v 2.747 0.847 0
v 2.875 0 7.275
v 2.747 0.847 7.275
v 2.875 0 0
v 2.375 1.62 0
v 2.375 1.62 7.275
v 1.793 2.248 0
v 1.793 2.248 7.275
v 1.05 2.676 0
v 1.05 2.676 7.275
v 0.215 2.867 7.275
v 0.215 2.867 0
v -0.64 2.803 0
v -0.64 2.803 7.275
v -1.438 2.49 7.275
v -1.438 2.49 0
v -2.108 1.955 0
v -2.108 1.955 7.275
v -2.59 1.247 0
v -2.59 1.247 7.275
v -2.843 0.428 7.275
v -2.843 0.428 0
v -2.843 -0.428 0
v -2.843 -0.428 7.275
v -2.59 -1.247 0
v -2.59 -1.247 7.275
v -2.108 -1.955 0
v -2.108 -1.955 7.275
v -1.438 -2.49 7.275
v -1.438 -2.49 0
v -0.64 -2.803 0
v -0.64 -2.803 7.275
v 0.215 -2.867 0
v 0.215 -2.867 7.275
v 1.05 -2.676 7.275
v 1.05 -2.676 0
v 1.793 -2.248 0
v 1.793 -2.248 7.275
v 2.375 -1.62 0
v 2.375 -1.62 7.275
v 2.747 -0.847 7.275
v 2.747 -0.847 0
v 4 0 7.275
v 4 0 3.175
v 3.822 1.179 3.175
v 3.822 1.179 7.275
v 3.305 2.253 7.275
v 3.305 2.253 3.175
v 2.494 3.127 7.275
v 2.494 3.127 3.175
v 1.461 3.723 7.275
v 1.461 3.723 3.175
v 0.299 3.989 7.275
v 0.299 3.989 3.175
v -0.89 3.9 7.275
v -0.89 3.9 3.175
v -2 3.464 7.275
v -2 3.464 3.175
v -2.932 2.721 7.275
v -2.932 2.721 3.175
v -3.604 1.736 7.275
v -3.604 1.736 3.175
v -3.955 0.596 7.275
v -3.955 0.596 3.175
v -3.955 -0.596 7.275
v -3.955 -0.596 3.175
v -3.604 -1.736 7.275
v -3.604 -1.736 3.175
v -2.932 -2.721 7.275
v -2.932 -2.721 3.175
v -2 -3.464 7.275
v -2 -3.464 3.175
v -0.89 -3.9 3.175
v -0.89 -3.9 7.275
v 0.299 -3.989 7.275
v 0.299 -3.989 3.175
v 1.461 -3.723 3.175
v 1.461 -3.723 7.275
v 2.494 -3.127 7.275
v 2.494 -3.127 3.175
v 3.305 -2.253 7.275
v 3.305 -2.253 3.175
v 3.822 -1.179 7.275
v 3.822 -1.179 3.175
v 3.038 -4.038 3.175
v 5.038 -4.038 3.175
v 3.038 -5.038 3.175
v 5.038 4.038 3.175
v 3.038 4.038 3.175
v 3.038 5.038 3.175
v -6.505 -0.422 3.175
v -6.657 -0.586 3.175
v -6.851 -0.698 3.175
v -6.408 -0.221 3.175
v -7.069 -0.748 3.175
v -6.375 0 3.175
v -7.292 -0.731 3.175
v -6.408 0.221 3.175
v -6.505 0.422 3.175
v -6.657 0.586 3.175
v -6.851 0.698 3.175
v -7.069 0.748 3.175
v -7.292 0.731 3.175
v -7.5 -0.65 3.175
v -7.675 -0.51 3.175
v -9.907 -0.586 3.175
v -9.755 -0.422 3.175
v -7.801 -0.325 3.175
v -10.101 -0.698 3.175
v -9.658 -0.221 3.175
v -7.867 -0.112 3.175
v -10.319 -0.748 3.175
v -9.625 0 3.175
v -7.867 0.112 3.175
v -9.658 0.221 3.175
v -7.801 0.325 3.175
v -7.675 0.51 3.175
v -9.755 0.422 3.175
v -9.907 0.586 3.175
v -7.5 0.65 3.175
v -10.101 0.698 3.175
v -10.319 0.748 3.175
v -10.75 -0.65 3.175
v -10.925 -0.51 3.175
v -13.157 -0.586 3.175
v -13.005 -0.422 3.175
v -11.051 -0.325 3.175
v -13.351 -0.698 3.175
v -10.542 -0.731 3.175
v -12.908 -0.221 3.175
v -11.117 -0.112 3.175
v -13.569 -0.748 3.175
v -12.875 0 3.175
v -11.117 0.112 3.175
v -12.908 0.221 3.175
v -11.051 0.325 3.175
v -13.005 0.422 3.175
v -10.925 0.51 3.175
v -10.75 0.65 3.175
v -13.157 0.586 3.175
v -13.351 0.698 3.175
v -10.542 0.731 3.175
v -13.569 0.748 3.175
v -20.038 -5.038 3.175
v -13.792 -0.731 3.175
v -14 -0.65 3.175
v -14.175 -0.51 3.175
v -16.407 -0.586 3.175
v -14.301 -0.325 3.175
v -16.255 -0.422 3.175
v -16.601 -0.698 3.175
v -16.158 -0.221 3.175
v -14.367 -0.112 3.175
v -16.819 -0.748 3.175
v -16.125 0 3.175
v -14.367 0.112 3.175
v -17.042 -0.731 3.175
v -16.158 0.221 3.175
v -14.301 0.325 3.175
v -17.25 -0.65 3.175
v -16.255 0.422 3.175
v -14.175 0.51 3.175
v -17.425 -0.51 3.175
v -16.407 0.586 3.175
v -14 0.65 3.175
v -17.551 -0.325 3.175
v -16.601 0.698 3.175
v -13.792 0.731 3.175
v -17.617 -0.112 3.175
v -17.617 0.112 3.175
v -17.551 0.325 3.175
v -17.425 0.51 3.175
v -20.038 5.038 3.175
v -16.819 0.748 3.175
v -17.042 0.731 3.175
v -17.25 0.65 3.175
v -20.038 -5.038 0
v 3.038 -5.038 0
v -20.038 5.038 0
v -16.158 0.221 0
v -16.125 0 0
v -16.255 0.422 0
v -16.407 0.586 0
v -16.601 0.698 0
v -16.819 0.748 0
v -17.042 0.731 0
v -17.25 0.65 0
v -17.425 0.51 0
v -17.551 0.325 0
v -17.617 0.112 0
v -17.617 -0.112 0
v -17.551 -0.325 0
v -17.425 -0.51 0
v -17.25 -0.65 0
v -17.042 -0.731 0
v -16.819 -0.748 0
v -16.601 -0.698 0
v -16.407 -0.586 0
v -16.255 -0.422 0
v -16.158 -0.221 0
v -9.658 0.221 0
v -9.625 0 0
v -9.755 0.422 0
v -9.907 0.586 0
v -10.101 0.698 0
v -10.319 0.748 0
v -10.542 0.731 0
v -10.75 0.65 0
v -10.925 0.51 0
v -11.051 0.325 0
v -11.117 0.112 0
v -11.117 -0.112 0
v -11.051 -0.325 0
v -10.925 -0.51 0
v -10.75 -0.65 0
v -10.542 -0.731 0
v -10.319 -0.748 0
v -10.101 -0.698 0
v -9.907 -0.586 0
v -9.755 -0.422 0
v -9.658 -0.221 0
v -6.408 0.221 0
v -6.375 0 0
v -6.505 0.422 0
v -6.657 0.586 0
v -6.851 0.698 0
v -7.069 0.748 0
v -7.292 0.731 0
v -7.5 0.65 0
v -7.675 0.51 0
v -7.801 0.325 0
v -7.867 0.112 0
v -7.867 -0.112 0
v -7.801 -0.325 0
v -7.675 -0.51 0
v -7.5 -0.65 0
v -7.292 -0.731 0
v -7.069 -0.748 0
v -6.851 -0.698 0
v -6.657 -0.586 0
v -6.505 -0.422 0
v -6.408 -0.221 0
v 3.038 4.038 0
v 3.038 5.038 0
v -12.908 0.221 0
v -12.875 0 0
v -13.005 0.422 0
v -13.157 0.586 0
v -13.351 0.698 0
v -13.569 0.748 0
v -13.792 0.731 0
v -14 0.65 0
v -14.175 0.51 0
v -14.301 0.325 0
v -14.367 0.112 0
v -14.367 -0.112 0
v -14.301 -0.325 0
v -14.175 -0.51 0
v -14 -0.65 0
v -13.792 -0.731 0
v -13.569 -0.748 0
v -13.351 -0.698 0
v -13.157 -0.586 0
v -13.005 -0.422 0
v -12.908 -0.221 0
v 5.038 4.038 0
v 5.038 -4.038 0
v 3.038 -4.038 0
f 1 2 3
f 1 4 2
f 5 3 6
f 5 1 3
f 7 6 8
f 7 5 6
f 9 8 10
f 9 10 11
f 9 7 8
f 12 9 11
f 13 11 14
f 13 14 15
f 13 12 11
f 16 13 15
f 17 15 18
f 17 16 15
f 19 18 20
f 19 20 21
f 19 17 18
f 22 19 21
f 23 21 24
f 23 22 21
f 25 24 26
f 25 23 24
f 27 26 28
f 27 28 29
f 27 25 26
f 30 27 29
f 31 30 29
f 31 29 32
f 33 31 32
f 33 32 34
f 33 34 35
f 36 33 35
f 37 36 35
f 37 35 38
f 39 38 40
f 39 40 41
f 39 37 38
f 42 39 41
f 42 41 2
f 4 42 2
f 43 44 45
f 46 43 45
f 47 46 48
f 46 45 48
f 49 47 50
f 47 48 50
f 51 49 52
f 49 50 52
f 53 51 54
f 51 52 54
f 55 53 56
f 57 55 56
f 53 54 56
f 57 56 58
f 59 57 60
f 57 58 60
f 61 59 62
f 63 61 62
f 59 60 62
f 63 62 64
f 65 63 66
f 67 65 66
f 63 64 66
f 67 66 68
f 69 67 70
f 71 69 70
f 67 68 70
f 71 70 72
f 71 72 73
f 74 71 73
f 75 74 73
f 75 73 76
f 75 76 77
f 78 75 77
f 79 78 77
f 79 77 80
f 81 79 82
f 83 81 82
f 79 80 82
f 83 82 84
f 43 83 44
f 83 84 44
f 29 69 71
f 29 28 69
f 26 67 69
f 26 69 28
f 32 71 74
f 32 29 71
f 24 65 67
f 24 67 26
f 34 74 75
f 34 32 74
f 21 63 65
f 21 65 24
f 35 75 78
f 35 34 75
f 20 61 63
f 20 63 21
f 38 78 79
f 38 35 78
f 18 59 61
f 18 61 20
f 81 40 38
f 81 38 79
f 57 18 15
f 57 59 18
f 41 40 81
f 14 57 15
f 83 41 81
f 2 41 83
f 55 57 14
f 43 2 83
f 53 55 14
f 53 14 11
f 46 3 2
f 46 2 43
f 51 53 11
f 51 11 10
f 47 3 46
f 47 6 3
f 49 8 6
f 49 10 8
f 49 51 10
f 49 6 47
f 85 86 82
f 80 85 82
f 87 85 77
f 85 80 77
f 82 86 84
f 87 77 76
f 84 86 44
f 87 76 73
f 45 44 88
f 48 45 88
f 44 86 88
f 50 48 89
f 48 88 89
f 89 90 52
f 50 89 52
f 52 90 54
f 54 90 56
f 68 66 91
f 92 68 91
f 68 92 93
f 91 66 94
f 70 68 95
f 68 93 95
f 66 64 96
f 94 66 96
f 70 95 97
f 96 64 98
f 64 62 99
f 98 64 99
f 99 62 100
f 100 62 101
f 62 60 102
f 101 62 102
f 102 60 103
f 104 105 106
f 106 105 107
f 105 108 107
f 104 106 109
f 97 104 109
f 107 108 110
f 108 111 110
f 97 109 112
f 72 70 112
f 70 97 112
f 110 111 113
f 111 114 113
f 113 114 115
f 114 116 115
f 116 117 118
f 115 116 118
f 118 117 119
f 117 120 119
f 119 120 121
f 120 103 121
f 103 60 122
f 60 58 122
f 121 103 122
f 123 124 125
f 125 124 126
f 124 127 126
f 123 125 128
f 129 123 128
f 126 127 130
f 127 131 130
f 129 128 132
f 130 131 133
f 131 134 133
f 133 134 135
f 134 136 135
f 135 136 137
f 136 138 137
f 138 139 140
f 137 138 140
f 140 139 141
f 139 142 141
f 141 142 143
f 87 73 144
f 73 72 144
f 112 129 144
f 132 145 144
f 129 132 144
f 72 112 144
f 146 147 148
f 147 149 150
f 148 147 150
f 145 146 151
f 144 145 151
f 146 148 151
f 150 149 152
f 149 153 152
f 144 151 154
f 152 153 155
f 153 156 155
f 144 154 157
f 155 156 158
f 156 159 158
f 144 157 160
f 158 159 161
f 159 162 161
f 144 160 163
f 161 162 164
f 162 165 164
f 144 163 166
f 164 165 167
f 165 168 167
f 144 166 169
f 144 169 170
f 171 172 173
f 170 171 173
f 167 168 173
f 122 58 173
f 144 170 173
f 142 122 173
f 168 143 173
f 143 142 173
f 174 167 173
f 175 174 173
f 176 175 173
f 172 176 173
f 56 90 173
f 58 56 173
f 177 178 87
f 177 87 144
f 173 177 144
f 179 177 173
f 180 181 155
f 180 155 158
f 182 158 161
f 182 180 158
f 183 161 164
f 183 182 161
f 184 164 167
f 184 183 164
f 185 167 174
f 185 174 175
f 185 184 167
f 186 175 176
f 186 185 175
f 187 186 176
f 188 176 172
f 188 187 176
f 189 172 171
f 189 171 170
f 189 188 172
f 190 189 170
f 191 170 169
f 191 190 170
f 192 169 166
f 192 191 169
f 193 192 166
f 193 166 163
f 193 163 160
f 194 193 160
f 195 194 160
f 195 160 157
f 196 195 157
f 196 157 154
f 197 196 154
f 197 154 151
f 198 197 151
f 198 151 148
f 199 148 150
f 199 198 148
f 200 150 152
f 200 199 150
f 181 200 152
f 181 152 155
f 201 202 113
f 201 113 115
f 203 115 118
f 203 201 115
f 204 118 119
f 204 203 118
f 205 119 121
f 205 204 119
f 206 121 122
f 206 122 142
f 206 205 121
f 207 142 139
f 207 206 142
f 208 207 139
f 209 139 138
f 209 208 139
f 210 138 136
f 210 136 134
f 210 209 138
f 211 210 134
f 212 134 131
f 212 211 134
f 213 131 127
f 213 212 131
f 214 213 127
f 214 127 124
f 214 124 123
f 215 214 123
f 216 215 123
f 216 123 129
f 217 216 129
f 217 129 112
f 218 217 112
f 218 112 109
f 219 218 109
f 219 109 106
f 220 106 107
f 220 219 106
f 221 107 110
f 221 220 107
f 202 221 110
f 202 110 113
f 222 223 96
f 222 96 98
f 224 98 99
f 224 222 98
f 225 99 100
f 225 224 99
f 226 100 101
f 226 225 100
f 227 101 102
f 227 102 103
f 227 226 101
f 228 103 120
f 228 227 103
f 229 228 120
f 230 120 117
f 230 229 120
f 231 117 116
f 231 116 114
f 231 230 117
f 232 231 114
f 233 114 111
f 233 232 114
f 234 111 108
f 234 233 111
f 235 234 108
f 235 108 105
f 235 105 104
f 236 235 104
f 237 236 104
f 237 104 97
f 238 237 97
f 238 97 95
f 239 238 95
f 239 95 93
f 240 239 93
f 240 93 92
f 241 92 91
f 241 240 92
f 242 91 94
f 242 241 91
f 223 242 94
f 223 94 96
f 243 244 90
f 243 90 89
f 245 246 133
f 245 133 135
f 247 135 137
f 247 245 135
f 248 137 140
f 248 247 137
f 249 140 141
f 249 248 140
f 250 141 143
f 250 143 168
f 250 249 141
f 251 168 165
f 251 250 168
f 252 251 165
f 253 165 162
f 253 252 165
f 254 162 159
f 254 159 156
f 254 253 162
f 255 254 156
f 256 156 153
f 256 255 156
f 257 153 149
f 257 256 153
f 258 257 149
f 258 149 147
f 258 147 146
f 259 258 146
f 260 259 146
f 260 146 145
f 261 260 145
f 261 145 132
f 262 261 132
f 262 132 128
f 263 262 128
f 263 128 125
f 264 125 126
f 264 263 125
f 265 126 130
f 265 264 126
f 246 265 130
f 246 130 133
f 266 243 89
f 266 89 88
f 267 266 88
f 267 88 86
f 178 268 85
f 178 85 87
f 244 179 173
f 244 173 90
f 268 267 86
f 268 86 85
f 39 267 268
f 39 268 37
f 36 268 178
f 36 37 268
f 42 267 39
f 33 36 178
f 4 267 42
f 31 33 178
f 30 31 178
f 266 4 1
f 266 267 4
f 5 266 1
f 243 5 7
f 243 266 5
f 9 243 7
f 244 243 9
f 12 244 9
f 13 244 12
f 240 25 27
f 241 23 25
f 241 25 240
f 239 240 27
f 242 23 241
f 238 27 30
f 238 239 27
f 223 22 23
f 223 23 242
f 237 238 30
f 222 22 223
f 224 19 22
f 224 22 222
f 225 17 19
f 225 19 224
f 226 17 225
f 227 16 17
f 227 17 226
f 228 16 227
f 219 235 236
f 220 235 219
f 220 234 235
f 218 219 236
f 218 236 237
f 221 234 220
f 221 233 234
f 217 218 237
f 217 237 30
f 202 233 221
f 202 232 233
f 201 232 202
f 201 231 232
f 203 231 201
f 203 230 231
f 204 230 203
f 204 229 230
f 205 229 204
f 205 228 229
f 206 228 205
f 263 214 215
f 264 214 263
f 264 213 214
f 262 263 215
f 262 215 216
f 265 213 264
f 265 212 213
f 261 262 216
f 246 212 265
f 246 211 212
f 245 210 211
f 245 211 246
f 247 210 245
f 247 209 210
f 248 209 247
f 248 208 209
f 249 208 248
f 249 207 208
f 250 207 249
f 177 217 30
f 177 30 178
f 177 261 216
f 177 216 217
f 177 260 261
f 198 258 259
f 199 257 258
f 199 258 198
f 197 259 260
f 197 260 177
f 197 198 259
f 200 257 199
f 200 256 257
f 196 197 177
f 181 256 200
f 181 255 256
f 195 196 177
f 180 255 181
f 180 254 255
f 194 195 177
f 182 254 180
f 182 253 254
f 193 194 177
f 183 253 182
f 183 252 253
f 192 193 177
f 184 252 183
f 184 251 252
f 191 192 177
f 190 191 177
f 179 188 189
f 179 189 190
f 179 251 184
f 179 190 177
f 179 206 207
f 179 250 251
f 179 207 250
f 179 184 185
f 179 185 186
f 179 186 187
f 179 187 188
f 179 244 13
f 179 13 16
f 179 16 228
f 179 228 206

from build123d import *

# Parameters (mm, degrees)
SKETCH1_R           = 2.875
SKETCH1_R_2         = 0.75
BOSS_EXTRUDE1_DEPTH = 3.175
SKETCH2_R           = 4
SKETCH2_R_2         = 2.875
BOSS_EXTRUDE2_DEPTH = 4.1
CUT_EXTRUDE1_DEPTH  = 30.25712561


with BuildPart() as part:
    # Sketch1 → Boss-Extrude1 (new body)
    with BuildSketch(Plane.XY):
        Polygon((-5.038135816, 5.038135816), (-5.038135816, 20.038135816), (5.038135816, 20.038135816), (5.038135816, 5.038135816), (20.038135816, 5.038135816), (20.038135816, -5.038135816), (5.038135816, -5.038135816), (5.038135816, -20.038135816), (-5.038135816, -20.038135816), (-5.038135816, -5.038135816), (-20.038135816, -5.038135816), (-20.038135816, 5.038135816), align=None)
        Circle(SKETCH1_R, mode=Mode.SUBTRACT)
        with Locations((0, 7.125)):
            Circle(SKETCH1_R_2, mode=Mode.SUBTRACT)
        with Locations((0, 10.375)):
            Circle(SKETCH1_R_2, mode=Mode.SUBTRACT)
        with Locations((0, 13.625)):
            Circle(SKETCH1_R_2, mode=Mode.SUBTRACT)
        with Locations((0, 16.875)):
            Circle(SKETCH1_R_2, mode=Mode.SUBTRACT)
        with Locations((7.125, 0)):
            Circle(SKETCH1_R_2, mode=Mode.SUBTRACT)
        with Locations((10.375, 0)):
            Circle(SKETCH1_R_2, mode=Mode.SUBTRACT)
        with Locations((13.625, 0)):
            Circle(SKETCH1_R_2, mode=Mode.SUBTRACT)
        with Locations((16.875, 0)):
            Circle(SKETCH1_R_2, mode=Mode.SUBTRACT)
        with Locations((0, -7.125)):
            Circle(SKETCH1_R_2, mode=Mode.SUBTRACT)
        with Locations((0, -10.375)):
            Circle(SKETCH1_R_2, mode=Mode.SUBTRACT)
        with Locations((0, -13.625)):
            Circle(SKETCH1_R_2, mode=Mode.SUBTRACT)
        with Locations((0, -16.875)):
            Circle(SKETCH1_R_2, mode=Mode.SUBTRACT)
        with Locations((-7.125, 0)):
            Circle(SKETCH1_R_2, mode=Mode.SUBTRACT)
        with Locations((-10.375, 0)):
            Circle(SKETCH1_R_2, mode=Mode.SUBTRACT)
        with Locations((-13.625, 0)):
            Circle(SKETCH1_R_2, mode=Mode.SUBTRACT)
        with Locations((-16.875, 0)):
            Circle(SKETCH1_R_2, mode=Mode.SUBTRACT)
    extrude(amount=BOSS_EXTRUDE1_DEPTH)

    # Sketch2 → Boss-Extrude2 (add)
    with BuildSketch(Plane.XY.offset(3.175)):
        Circle(SKETCH2_R)
        Circle(SKETCH2_R_2, mode=Mode.SUBTRACT)
    extrude(amount=BOSS_EXTRUDE2_DEPTH)

    # Sketch3 → Cut-Extrude1 (cut, through all)
    with BuildSketch(Plane(origin=(0, 0, 0), x_dir=(-1, 0, 0), z_dir=(0, 0, -1))):
        Polygon((-5.038135798, 4.038135816), (-5.038135798, -4.038135816), (-3.038135798, -4.038135816), (-3.038135798, -5.038135816), (5.038135816, -5.038135816), (5.038135816, -21.038135816), (-5.038135816, -21.038135816), (-5.038135816, -5.038135816), (-21.038135816, -5.038135816), (-21.038135816, 5.038135816), (-5.038135816, 5.038135816), (-5.038135816, 21.038135816), (5.038135816, 21.038135816), (5.038135816, 5.038135816), (-3.038135798, 5.038135816), (-3.038135798, 4.038135816), align=None)
    extrude(amount=-CUT_EXTRUDE1_DEPTH, mode=Mode.SUBTRACT)


solid = part.part
